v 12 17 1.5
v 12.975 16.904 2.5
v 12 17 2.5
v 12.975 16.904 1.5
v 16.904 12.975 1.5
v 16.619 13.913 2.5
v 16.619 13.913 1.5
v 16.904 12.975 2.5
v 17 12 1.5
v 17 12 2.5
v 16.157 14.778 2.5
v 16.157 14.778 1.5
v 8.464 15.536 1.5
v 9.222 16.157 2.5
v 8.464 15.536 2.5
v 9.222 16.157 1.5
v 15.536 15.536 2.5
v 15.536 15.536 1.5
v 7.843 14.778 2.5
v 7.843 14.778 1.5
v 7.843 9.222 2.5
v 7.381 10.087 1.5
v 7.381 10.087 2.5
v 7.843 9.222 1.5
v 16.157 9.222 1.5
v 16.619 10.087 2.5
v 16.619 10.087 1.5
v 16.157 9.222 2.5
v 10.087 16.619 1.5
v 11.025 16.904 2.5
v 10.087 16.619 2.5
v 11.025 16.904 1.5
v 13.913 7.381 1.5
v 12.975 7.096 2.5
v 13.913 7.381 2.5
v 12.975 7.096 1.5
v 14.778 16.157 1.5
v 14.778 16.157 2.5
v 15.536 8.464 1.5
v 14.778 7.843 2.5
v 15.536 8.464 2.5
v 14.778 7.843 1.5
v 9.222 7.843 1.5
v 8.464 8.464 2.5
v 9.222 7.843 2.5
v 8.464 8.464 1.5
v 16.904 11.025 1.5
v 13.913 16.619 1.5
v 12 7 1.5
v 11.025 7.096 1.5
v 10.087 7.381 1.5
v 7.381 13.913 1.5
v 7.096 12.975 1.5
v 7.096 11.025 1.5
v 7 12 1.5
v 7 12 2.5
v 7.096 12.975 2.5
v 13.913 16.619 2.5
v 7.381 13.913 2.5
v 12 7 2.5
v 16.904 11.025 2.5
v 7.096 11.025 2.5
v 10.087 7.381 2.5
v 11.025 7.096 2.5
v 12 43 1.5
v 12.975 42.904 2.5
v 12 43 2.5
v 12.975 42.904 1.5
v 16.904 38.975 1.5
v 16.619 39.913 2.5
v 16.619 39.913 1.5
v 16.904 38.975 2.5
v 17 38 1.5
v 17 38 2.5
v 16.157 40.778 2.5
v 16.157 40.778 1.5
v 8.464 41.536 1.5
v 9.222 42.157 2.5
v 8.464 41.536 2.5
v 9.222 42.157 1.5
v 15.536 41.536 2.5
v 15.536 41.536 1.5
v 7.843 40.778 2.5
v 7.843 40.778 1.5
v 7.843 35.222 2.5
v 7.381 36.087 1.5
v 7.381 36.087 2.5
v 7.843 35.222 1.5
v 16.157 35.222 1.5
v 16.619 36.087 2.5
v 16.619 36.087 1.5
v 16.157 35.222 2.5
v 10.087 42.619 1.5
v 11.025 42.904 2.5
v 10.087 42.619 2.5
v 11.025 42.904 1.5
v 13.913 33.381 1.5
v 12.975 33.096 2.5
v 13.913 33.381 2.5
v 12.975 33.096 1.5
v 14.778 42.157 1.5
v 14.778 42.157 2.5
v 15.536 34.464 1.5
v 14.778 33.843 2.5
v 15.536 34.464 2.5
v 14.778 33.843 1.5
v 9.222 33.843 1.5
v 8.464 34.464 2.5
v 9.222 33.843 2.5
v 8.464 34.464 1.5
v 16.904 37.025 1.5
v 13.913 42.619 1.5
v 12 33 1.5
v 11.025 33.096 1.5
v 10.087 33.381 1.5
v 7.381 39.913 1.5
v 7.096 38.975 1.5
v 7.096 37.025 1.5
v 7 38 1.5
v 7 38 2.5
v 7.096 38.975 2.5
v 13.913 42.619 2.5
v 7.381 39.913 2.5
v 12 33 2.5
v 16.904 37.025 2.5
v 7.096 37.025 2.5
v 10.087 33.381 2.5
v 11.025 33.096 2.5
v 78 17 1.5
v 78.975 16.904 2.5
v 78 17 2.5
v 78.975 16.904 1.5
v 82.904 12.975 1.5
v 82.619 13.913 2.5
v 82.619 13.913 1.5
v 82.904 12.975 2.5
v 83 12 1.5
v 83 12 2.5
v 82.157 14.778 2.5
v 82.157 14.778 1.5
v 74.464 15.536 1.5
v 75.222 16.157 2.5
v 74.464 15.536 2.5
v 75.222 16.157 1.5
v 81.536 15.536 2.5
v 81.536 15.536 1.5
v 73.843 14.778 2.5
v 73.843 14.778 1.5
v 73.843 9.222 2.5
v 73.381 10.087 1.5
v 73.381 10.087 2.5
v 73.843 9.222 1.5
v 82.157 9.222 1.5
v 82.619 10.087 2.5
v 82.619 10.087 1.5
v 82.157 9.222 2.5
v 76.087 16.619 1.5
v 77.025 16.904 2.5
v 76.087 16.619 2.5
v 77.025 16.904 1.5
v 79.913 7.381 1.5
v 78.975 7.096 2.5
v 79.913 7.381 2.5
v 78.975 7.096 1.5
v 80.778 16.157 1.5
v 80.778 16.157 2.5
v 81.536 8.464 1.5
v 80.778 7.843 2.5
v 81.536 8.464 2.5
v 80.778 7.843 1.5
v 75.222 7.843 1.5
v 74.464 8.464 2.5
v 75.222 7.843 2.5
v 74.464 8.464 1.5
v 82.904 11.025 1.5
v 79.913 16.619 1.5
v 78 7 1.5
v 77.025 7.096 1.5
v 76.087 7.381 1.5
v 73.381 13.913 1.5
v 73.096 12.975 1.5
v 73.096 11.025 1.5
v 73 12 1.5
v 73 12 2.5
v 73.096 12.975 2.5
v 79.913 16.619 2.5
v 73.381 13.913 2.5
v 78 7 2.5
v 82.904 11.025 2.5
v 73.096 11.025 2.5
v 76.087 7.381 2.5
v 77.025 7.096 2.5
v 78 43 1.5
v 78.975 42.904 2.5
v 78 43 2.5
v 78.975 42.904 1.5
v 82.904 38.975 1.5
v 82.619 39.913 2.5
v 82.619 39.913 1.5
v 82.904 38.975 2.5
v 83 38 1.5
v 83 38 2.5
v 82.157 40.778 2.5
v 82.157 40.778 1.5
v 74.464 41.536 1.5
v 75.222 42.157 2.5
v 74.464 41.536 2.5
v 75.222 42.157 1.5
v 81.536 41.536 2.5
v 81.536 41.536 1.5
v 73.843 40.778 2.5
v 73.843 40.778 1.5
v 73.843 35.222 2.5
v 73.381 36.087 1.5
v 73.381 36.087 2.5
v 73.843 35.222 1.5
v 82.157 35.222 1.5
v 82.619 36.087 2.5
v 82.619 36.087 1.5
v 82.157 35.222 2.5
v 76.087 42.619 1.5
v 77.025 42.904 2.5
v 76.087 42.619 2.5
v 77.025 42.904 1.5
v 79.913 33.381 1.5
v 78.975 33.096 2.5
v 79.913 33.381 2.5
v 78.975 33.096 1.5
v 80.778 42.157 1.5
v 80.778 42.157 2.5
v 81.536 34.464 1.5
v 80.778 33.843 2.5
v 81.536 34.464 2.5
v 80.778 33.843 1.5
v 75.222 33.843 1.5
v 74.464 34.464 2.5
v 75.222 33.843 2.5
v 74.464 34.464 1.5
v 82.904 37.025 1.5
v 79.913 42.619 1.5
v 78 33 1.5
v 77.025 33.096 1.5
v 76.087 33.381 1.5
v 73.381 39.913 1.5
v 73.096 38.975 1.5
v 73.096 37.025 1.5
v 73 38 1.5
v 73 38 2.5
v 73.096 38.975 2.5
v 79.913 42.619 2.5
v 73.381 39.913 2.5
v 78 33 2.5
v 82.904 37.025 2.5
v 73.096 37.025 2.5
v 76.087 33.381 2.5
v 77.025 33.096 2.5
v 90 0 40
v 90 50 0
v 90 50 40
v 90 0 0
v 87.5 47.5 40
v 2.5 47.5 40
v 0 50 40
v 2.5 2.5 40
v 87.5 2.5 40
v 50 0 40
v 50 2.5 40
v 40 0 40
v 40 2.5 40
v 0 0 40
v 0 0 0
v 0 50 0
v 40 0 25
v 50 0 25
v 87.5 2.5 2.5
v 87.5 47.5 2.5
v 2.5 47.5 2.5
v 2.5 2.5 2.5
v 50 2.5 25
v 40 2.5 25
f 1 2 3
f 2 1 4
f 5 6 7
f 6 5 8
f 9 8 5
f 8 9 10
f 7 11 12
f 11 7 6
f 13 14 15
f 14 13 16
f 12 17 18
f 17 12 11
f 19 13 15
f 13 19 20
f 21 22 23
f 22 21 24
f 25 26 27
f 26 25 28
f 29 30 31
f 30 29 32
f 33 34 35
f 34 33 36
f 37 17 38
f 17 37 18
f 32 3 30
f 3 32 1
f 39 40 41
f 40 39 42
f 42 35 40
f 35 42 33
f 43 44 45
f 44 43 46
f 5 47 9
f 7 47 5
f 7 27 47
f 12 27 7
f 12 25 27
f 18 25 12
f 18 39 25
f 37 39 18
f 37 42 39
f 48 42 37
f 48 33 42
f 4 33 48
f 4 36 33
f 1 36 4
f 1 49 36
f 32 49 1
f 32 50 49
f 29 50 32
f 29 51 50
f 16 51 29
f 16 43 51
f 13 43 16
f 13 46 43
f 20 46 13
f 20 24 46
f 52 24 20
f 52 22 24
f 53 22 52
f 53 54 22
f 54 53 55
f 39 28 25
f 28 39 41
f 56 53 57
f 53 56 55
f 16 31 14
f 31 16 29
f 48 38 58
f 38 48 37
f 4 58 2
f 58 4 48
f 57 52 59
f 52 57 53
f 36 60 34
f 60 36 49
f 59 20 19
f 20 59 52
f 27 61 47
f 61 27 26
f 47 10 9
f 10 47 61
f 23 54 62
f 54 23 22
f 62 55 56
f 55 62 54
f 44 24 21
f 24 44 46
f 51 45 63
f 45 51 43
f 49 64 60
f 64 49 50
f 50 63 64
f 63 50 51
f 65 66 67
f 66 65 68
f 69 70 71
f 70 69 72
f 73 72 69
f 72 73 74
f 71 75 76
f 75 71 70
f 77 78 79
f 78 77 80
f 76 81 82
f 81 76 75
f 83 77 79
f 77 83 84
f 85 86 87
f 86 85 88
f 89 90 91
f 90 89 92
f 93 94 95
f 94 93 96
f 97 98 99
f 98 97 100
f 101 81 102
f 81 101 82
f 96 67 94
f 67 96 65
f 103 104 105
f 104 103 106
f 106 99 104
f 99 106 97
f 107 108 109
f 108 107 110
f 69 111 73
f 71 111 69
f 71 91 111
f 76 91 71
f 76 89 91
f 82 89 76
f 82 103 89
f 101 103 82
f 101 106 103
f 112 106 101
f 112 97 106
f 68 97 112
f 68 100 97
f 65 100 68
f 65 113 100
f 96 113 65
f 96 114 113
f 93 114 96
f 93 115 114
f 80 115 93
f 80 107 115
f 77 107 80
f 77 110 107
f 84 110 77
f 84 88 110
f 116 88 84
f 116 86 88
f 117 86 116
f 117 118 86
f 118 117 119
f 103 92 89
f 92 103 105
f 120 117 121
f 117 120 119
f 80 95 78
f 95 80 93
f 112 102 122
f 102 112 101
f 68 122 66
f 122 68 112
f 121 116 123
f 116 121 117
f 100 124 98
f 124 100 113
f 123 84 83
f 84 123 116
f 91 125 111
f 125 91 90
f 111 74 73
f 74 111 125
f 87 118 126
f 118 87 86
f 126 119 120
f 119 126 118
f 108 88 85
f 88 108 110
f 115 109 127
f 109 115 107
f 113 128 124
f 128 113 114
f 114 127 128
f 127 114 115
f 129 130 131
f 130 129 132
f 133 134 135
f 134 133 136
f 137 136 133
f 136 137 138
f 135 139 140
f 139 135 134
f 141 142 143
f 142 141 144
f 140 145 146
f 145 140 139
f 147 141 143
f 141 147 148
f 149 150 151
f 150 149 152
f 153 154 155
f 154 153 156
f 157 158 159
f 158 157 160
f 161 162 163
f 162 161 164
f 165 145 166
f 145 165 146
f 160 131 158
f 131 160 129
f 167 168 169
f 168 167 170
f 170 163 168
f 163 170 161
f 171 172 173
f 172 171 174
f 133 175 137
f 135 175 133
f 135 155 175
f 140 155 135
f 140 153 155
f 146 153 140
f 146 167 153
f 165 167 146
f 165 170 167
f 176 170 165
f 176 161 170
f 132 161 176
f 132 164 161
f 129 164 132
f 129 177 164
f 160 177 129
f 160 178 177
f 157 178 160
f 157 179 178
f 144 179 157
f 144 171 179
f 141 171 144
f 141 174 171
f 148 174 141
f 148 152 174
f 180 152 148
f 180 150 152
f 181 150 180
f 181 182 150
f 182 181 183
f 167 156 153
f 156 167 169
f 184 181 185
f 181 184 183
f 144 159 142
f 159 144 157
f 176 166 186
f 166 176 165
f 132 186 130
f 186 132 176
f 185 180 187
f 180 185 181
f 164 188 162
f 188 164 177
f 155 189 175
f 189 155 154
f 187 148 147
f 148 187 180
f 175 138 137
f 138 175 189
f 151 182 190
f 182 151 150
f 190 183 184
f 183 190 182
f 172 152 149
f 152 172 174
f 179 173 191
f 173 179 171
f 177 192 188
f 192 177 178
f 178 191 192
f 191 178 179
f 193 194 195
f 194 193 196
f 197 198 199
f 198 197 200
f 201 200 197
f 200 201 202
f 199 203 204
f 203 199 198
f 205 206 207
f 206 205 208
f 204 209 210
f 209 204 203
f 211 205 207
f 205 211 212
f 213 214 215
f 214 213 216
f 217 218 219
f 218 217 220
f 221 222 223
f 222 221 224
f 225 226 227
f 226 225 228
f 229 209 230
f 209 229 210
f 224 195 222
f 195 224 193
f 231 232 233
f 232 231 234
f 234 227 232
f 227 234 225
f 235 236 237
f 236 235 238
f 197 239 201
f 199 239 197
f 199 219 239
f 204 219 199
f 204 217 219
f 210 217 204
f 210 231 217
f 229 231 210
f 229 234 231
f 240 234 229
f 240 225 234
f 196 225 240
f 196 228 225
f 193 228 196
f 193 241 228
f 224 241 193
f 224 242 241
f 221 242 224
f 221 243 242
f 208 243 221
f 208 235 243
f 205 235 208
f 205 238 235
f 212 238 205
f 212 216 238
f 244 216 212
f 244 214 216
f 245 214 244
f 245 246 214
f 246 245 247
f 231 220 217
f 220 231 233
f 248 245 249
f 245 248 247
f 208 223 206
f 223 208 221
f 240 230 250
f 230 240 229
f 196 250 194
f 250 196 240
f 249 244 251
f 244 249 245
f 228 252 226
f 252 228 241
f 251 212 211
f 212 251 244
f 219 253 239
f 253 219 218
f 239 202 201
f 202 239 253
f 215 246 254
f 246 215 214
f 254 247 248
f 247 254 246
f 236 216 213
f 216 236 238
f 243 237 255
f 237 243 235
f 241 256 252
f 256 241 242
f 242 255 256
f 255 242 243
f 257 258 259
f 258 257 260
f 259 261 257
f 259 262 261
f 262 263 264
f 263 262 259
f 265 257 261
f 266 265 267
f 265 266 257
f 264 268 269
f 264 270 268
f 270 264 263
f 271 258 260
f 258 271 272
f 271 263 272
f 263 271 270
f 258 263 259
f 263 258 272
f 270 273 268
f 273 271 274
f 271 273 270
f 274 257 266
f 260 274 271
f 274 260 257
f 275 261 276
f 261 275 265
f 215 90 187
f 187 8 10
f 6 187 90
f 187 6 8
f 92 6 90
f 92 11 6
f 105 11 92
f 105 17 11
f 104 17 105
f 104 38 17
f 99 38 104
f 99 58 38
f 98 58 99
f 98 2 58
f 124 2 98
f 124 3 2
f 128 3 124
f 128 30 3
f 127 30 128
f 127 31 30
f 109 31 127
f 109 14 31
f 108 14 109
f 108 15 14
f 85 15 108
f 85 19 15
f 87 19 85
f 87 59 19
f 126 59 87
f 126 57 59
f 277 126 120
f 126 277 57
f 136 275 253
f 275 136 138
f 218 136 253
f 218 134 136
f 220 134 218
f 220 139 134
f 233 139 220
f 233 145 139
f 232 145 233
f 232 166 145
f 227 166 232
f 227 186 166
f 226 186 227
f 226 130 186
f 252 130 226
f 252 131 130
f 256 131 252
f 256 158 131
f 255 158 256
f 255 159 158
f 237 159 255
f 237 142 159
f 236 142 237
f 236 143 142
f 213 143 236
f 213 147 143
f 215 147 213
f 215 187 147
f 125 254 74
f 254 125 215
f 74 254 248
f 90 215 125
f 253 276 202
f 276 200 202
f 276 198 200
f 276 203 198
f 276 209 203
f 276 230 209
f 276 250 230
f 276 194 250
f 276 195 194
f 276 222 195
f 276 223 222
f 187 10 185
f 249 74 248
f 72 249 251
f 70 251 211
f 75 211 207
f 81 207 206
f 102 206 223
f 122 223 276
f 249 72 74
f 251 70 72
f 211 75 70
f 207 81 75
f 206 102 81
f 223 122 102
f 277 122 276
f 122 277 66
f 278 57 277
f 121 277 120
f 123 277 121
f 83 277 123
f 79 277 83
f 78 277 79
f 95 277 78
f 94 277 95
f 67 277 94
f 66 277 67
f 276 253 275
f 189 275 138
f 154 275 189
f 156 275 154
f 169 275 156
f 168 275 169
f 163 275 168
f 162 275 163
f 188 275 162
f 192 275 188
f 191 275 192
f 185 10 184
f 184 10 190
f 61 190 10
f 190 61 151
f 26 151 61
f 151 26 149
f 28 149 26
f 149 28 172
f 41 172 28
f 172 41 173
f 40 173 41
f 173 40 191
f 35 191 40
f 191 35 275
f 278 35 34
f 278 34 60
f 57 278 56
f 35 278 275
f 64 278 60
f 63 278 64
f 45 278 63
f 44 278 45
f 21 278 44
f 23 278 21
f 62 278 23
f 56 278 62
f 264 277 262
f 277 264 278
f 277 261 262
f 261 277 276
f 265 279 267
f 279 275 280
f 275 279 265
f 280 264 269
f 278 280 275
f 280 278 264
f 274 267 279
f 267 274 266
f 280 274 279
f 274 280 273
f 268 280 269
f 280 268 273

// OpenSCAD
$fn = 32;

// ----------------------------------------------------------------------
// Enclosure box: both enclosure
// ----------------------------------------------------------------------

// --- parameters (mm) ---
box_l = 90;               // outer length, X
box_w = 50;               // outer width, Y
box_h = 40;               // outer height
wall_t = 2.5;             // wall thickness
boss_r = 5;               // corner boss radius
hole_r = 1.5;             // boss screw hole radius
boss_in = 12;             // boss inset from the corners
notch_w = 10;             // cable notch width
notch_h = 15;             // cable notch height

inner_h = box_h - wall_t;  // cavity depth
boss_h = inner_h - 2;  // corner boss height

difference() {
  cube([box_l, box_w, box_h]);
  translate([wall_t, wall_t, wall_t])
    cube([box_l - 2 * wall_t, box_w - 2 * wall_t, box_h]);
  for (sx = [0, 1], sy = [0, 1])
    translate([sx ? box_l - boss_in : boss_in,
               sy ? box_w - boss_in : boss_in, wall_t - 1]) {
      cylinder(r = boss_r, h = boss_h);
      translate([0, 0, boss_h - 4])
        cylinder(r = hole_r, h = 5);
    }
  translate([box_l / 2 - notch_w / 2, -1, box_h - notch_h])
    cube([notch_w, wall_t + 2, notch_h + 1]);
}
